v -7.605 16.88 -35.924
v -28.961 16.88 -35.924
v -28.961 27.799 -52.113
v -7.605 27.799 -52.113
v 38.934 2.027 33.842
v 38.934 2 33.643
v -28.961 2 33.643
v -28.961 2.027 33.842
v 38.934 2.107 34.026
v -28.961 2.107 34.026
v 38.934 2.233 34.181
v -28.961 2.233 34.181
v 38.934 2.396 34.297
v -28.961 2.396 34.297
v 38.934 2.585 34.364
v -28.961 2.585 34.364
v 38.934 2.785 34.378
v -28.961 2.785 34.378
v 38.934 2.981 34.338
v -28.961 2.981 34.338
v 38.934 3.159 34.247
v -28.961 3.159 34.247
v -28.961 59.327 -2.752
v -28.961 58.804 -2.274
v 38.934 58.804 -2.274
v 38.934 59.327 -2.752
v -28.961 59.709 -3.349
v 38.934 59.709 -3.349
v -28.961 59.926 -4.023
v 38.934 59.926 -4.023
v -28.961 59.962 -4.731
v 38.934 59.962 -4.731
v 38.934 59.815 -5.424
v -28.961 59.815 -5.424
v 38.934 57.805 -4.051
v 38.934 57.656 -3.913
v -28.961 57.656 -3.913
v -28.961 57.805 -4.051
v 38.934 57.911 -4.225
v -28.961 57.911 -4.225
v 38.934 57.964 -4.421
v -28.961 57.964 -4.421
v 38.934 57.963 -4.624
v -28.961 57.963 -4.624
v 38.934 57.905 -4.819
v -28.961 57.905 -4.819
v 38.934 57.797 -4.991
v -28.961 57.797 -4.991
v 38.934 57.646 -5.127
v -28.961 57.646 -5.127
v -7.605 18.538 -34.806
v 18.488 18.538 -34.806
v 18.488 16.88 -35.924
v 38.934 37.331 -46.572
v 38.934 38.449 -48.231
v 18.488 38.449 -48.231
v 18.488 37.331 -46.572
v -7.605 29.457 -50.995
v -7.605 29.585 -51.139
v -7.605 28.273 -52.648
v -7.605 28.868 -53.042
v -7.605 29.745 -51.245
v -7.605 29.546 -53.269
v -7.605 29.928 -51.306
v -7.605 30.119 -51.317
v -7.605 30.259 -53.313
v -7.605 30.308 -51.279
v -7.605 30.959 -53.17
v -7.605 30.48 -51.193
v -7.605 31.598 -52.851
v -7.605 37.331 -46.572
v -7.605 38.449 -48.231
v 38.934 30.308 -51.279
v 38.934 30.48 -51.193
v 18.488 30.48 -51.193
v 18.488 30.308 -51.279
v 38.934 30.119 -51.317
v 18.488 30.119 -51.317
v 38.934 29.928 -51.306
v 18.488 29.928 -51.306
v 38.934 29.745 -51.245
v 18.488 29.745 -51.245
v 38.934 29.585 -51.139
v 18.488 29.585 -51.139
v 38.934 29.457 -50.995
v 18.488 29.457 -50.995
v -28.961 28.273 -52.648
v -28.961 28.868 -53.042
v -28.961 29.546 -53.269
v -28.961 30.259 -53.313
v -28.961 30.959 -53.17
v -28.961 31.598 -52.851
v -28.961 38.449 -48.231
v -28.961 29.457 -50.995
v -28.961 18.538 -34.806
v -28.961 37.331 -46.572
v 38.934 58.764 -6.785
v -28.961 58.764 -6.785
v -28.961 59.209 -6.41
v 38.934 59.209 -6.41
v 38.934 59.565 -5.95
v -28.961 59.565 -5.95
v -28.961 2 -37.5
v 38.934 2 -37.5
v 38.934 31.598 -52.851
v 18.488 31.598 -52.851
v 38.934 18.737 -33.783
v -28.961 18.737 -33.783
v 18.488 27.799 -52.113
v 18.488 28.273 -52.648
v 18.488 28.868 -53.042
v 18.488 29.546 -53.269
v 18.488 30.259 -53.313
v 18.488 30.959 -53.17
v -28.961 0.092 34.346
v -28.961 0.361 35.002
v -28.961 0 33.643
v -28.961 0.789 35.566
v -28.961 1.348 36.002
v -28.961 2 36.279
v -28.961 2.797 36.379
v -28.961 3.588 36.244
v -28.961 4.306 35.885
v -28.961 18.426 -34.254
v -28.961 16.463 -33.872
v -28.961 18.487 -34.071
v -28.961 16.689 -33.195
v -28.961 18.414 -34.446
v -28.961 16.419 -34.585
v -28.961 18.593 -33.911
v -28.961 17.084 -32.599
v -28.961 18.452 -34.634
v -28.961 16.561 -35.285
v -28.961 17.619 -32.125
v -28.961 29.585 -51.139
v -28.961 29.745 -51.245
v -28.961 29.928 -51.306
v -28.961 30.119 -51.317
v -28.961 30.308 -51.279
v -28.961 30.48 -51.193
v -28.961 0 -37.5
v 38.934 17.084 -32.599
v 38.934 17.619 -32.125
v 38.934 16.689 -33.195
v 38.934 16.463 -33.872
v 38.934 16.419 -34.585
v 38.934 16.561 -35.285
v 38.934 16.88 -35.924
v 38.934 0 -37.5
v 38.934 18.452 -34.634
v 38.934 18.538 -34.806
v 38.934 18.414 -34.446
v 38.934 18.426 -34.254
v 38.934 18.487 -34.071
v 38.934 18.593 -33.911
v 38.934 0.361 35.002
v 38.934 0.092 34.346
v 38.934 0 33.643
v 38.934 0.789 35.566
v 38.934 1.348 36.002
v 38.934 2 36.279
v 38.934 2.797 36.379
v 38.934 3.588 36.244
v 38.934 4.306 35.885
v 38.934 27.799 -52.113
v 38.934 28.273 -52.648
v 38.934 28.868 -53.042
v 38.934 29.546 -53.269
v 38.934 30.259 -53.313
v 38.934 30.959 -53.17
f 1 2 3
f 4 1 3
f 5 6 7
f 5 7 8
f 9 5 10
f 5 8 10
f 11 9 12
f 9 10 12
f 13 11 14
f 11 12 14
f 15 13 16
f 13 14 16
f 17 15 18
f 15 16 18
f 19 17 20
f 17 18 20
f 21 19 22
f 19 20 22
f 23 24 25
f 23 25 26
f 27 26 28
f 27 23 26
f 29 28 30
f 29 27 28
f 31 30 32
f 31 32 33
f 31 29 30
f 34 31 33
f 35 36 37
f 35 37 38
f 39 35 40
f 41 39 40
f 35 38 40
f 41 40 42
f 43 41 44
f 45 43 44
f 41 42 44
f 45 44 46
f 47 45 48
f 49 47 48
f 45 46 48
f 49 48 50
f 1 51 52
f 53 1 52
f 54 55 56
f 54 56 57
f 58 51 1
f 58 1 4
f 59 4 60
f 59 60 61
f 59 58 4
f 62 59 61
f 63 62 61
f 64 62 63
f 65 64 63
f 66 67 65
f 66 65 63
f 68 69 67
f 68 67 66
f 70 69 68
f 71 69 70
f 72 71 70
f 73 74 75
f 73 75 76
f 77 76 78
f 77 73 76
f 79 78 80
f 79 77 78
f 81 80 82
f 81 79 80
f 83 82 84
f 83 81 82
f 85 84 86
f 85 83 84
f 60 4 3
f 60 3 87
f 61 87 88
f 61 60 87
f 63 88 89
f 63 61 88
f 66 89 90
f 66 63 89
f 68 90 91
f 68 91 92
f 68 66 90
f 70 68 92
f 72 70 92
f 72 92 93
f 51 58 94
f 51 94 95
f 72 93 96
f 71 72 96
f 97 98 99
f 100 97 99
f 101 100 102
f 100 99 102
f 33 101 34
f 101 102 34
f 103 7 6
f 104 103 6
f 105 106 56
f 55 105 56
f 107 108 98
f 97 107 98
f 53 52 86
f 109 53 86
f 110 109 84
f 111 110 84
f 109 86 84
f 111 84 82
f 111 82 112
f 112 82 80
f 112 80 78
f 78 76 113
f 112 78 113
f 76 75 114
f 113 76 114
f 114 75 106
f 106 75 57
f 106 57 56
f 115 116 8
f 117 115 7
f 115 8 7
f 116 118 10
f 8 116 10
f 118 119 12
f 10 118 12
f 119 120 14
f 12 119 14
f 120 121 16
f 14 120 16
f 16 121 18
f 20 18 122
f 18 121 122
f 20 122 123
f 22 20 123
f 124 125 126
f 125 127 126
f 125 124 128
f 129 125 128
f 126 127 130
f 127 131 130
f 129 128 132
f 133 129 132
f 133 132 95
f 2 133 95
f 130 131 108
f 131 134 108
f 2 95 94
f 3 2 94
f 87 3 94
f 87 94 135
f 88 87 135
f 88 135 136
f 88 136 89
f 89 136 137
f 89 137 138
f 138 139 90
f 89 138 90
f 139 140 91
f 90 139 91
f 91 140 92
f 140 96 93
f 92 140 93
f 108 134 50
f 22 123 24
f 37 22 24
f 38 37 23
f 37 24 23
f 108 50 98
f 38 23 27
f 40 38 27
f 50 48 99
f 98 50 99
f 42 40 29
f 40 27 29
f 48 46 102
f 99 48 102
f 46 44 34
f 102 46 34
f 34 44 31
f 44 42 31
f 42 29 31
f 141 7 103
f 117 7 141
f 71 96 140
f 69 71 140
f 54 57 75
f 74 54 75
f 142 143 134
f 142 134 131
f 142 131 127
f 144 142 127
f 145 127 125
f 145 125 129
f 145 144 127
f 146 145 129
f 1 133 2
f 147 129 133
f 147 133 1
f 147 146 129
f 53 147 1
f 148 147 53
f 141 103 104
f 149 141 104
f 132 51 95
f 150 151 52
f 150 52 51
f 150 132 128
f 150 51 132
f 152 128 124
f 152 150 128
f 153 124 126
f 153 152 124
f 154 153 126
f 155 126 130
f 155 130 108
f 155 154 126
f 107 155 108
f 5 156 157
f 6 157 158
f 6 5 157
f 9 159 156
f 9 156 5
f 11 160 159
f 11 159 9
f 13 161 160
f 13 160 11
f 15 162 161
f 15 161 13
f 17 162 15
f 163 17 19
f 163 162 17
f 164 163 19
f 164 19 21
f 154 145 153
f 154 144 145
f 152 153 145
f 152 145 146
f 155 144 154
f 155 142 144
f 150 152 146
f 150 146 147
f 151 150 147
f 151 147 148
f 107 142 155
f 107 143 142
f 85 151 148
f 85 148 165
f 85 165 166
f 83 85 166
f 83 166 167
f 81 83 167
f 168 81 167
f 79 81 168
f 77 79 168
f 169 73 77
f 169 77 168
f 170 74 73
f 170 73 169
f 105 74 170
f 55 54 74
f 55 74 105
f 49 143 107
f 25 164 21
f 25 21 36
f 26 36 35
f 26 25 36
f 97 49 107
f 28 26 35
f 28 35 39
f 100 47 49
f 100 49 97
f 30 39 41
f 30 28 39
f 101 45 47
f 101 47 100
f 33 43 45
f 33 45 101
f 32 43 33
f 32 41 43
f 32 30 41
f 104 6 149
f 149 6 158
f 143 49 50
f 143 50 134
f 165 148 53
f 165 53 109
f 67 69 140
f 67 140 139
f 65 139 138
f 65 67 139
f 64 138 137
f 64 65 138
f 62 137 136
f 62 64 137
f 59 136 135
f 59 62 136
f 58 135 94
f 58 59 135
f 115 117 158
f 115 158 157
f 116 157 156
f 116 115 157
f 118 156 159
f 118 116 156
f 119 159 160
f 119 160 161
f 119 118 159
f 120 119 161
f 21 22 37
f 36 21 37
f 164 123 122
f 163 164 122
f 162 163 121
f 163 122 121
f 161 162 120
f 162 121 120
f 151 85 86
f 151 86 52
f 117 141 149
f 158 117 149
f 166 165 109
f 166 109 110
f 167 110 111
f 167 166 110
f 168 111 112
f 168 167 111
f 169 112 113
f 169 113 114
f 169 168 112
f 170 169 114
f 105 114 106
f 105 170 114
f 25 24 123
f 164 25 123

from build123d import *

# Parameters (mm, degrees)
SKETCH1_W                      = 67.895404789
SKETCH1_H                      = 2
BASE_FLANGE1_DEPTH             = 37.5
EDGE_FLANGE1_START             = -28.961034246
EDGE_FLANGE1_DEPTH             = 67.895404789
EDGE_FLANGE1_2_DEPTH           = 67.895404789
EDGE_FLANGE2_START             = -28.961034246
EDGE_FLANGE2_DEPTH             = 67.895404789
EDGE_FLANGE2_2_DEPTH           = 67.895404789
EDGE_FLANGE3_STRIP_W           = 9.4732
EDGE_FLANGE3_STRIP_H           = 2
EDGE_FLANGE3_STRIP_CUT_DEPTH   = 67.89540479
EDGE_FLANGE3_DEPTH             = 67.89540479
CUT_EXTRUDE1_REACH             = 92.8
SKETCH15_W                     = 26.092581692
SKETCH15_H                     = 22.2634
EDGE_FLANGE4_STRIP_W           = 9.4732
EDGE_FLANGE4_STRIP_H           = 2
EDGE_FLANGE4_STRIP_CUT_DEPTH   = 20.44630838
EDGE_FLANGE4_STRIP_2_W         = 9.4732
EDGE_FLANGE4_STRIP_2_H         = 2
EDGE_FLANGE4_STRIP_CUT_2_DEPTH = 21.356514718
EDGE_FLANGE4_DEPTH             = 20.44630838
EDGE_FLANGE4_BEND_DEPTH        = 21.356514718


# Read off the part's stored shape, not the designer's step: Edge-Flange1, Edge-Flange2
# Sheet-metal steps are written as plain solids
with BuildPart() as part:
    # Sketch1 → Base-Flange1 (new, symmetric)
    with BuildSketch(Plane.XY):
        with Locations((4.986668148, 1)):
            Rectangle(SKETCH1_W, SKETCH1_H)
    extrude(amount=BASE_FLANGE1_DEPTH, both=True)

    # Edge-Flange1 outline → Edge-Flange1 (cut)
    with BuildSketch(Plane.YZ.offset(EDGE_FLANGE1_START)):
        with BuildLine():
            ThreePointArc((0, 33.643455388), (0.556604688, 35.297722597), (2, 36.279057786))
            Line((2, 36.279057786), (2, 37.5))
            Line((2, 37.5), (0, 37.5))
            Line((0, 37.5), (0, 33.643455388))
        make_face()
    extrude(amount=EDGE_FLANGE1_DEPTH, mode=Mode.SUBTRACT)

    # Edge-Flange1 2 outline → Edge-Flange1 2 (add)
    with BuildSketch(Plane.YZ.offset(EDGE_FLANGE1_START)):
        with BuildLine():
            Line((61.436403322, -4.11781765), (4.306249276, 35.885146872))
            ThreePointArc((4.306249276, 35.885146872), (3.197343124, 36.340990436), (2, 36.279057786))
            Line((2, 36.279057786), (2, 33.643455388))
            ThreePointArc((2, 33.643455388), (2.396475972, 34.296827567), (3.159096403, 34.246842784))
            Line((3.159096403, 34.246842784), (60.289250449, -5.756121738))
            Line((60.289250449, -5.756121738), (61.436403322, -4.11781765))
        make_face()
    extrude(amount=EDGE_FLANGE1_2_DEPTH)

    # Edge-Flange2 outline → Edge-Flange2 (cut)
    with BuildSketch(Plane.YZ.offset(EDGE_FLANGE2_START)):
        with BuildLine():
            ThreePointArc((58.80360799, -2.274314512), (59.839449023, -3.679107071), (59.81541421, -5.424338031))
            Line((59.81541421, -5.424338031), (60.289250449, -5.756121738))
            Line((60.289250449, -5.756121738), (61.436403322, -4.11781765))
            Line((61.436403322, -4.11781765), (58.80360799, -2.274314512))
        make_face()
    extrude(amount=EDGE_FLANGE2_DEPTH, mode=Mode.SUBTRACT)

    # Edge-Flange2 2 outline → Edge-Flange2 2 (add)
    with BuildSketch(Plane.YZ.offset(EDGE_FLANGE2_START)):
        with BuildLine():
            Line((16.468222849, -35.313778071), (58.764246014, -6.784750218))
            ThreePointArc((58.764246014, -6.784750218), (59.399434997, -6.189234023), (59.81541421, -5.424338031))
            Line((59.81541421, -5.424338031), (57.656455118, -3.912618601))
            ThreePointArc((57.656455118, -3.912618601), (57.970530667, -4.522433963), (57.645860207, -5.126675073))
            Line((57.645860207, -5.126675073), (15.349837042, -33.655702926))
            Line((15.349837042, -33.655702926), (16.468222849, -35.313778071))
        make_face()
    extrude(amount=EDGE_FLANGE2_2_DEPTH)

    # Edge-Flange3 strip (across the edge) → Edge-Flange3 strip cut (cut)
    with BuildSketch(Plane(origin=(38.934370543, 16.468222849, -35.313778071), x_dir=(0, 0.829037572555041, 0.5591929034707481), z_dir=(-1, 0, 0))):
        with Locations((-2, -1)):
            Rectangle(EDGE_FLANGE3_STRIP_W, EDGE_FLANGE3_STRIP_H)
    extrude(amount=EDGE_FLANGE3_STRIP_CUT_DEPTH, mode=Mode.SUBTRACT)

    # Edge-Flange3 section (across the edge) → Edge-Flange3 (add)
    with BuildSketch(Plane(origin=(38.934370543, 16.468222849, -35.313778071), x_dir=(0, 0.829037572555041, 0.5591929034707481), z_dir=(-1, 0, 0))):
        with BuildLine():
            Line((0, 0.7366), (0, 23))
            Line((0, 23), (2, 23))
            Line((2, 23), (2, 0.7366))
            ThreePointArc((2, 0.7366), (2.215745145, 0.215745145), (2.7366, 0))
            Line((2.7366, 0), (2.7366, -2))
            ThreePointArc((2.7366, -2), (0.801531583, -1.198468417), (0, 0.7366))
        make_face()
    extrude(amount=EDGE_FLANGE3_DEPTH)

    # Sketch15 → Cut-Extrude1 (cut, up to next)
    with BuildSketch(Plane(origin=(0, -3.394443435, -2.289581007), x_dir=(1, 0, 0), z_dir=(0, 0.8290375725550408, 0.559192903470748)), mode=Mode.PRIVATE) as cut_extrude1_sk1:
        with Locations((5.441771317, 50.3536622)):
            Rectangle(SKETCH15_W, SKETCH15_H)
    cut_extrude1_tool1 = extrude(cut_extrude1_sk1.sketch, amount=-CUT_EXTRUDE1_REACH, mode=Mode.PRIVATE) & part.part
    add(cut_extrude1_tool1.solids().sort_by_distance((5.441771, 24.762967, -44.034659))[0], mode=Mode.SUBTRACT)

    # Edge-Flange4 strip (across the edge) → Edge-Flange4 strip cut (cut)
    with BuildSketch(Plane(origin=(38.934370543, 30.987734774, -53.263256433), x_dir=(0, -0.5591929034707451, 0.8290375725550428), z_dir=(-1, 0, 0))):
        with Locations((-2, -1)):
            Rectangle(EDGE_FLANGE4_STRIP_W, EDGE_FLANGE4_STRIP_H)
    extrude(amount=EDGE_FLANGE4_STRIP_CUT_DEPTH, mode=Mode.SUBTRACT)

    # Edge-Flange4 strip 2 (across the edge) → Edge-Flange4 strip cut 2 (cut)
    with BuildSketch(Plane(origin=(-7.604519529, 30.987734774, -53.263256433), x_dir=(0, -0.5591929034707451, 0.8290375725550428), z_dir=(-1, 0, 0))):
        with Locations((-2, -1)):
            Rectangle(EDGE_FLANGE4_STRIP_2_W, EDGE_FLANGE4_STRIP_2_H)
    extrude(amount=EDGE_FLANGE4_STRIP_CUT_2_DEPTH, mode=Mode.SUBTRACT)

    # Edge-Flange4 section (across the edge) → Edge-Flange4 (add)
    with BuildSketch(Plane(origin=(38.934370543, 30.987734774, -53.263256433), x_dir=(0, -0.5591929034707451, 0.8290375725550428), z_dir=(-1, 0, 0))):
        with BuildLine():
            Line((0, 0.7366), (0, 9))
            Line((0, 9), (2, 9))
            Line((2, 9), (2, 0.7366))
            ThreePointArc((2, 0.7366), (2.215745145, 0.215745145), (2.7366, 0))
            Line((2.7366, 0), (2.7366, -2))
            ThreePointArc((2.7366, -2), (0.801531583, -1.198468417), (0, 0.7366))
        make_face()
    extrude(amount=EDGE_FLANGE4_DEPTH)

    # Edge-Flange4 section 2 (across the edge) → Edge-Flange4 bend (add)
    with BuildSketch(Plane(origin=(-7.604519529, 30.987734774, -53.263256433), x_dir=(0, -0.5591929034707451, 0.8290375725550428), z_dir=(-1, 0, 0))):
        with BuildLine():
            Line((0, 0.7366), (0, 9))
            Line((0, 9), (2, 9))
            Line((2, 9), (2, 0.7366))
            ThreePointArc((2, 0.7366), (2.215745145, 0.215745145), (2.7366, 0))
            Line((2.7366, 0), (2.7366, -2))
            ThreePointArc((2.7366, -2), (0.801531583, -1.198468417), (0, 0.7366))
        make_face()
    extrude(amount=EDGE_FLANGE4_BEND_DEPTH)


solid = part.part
